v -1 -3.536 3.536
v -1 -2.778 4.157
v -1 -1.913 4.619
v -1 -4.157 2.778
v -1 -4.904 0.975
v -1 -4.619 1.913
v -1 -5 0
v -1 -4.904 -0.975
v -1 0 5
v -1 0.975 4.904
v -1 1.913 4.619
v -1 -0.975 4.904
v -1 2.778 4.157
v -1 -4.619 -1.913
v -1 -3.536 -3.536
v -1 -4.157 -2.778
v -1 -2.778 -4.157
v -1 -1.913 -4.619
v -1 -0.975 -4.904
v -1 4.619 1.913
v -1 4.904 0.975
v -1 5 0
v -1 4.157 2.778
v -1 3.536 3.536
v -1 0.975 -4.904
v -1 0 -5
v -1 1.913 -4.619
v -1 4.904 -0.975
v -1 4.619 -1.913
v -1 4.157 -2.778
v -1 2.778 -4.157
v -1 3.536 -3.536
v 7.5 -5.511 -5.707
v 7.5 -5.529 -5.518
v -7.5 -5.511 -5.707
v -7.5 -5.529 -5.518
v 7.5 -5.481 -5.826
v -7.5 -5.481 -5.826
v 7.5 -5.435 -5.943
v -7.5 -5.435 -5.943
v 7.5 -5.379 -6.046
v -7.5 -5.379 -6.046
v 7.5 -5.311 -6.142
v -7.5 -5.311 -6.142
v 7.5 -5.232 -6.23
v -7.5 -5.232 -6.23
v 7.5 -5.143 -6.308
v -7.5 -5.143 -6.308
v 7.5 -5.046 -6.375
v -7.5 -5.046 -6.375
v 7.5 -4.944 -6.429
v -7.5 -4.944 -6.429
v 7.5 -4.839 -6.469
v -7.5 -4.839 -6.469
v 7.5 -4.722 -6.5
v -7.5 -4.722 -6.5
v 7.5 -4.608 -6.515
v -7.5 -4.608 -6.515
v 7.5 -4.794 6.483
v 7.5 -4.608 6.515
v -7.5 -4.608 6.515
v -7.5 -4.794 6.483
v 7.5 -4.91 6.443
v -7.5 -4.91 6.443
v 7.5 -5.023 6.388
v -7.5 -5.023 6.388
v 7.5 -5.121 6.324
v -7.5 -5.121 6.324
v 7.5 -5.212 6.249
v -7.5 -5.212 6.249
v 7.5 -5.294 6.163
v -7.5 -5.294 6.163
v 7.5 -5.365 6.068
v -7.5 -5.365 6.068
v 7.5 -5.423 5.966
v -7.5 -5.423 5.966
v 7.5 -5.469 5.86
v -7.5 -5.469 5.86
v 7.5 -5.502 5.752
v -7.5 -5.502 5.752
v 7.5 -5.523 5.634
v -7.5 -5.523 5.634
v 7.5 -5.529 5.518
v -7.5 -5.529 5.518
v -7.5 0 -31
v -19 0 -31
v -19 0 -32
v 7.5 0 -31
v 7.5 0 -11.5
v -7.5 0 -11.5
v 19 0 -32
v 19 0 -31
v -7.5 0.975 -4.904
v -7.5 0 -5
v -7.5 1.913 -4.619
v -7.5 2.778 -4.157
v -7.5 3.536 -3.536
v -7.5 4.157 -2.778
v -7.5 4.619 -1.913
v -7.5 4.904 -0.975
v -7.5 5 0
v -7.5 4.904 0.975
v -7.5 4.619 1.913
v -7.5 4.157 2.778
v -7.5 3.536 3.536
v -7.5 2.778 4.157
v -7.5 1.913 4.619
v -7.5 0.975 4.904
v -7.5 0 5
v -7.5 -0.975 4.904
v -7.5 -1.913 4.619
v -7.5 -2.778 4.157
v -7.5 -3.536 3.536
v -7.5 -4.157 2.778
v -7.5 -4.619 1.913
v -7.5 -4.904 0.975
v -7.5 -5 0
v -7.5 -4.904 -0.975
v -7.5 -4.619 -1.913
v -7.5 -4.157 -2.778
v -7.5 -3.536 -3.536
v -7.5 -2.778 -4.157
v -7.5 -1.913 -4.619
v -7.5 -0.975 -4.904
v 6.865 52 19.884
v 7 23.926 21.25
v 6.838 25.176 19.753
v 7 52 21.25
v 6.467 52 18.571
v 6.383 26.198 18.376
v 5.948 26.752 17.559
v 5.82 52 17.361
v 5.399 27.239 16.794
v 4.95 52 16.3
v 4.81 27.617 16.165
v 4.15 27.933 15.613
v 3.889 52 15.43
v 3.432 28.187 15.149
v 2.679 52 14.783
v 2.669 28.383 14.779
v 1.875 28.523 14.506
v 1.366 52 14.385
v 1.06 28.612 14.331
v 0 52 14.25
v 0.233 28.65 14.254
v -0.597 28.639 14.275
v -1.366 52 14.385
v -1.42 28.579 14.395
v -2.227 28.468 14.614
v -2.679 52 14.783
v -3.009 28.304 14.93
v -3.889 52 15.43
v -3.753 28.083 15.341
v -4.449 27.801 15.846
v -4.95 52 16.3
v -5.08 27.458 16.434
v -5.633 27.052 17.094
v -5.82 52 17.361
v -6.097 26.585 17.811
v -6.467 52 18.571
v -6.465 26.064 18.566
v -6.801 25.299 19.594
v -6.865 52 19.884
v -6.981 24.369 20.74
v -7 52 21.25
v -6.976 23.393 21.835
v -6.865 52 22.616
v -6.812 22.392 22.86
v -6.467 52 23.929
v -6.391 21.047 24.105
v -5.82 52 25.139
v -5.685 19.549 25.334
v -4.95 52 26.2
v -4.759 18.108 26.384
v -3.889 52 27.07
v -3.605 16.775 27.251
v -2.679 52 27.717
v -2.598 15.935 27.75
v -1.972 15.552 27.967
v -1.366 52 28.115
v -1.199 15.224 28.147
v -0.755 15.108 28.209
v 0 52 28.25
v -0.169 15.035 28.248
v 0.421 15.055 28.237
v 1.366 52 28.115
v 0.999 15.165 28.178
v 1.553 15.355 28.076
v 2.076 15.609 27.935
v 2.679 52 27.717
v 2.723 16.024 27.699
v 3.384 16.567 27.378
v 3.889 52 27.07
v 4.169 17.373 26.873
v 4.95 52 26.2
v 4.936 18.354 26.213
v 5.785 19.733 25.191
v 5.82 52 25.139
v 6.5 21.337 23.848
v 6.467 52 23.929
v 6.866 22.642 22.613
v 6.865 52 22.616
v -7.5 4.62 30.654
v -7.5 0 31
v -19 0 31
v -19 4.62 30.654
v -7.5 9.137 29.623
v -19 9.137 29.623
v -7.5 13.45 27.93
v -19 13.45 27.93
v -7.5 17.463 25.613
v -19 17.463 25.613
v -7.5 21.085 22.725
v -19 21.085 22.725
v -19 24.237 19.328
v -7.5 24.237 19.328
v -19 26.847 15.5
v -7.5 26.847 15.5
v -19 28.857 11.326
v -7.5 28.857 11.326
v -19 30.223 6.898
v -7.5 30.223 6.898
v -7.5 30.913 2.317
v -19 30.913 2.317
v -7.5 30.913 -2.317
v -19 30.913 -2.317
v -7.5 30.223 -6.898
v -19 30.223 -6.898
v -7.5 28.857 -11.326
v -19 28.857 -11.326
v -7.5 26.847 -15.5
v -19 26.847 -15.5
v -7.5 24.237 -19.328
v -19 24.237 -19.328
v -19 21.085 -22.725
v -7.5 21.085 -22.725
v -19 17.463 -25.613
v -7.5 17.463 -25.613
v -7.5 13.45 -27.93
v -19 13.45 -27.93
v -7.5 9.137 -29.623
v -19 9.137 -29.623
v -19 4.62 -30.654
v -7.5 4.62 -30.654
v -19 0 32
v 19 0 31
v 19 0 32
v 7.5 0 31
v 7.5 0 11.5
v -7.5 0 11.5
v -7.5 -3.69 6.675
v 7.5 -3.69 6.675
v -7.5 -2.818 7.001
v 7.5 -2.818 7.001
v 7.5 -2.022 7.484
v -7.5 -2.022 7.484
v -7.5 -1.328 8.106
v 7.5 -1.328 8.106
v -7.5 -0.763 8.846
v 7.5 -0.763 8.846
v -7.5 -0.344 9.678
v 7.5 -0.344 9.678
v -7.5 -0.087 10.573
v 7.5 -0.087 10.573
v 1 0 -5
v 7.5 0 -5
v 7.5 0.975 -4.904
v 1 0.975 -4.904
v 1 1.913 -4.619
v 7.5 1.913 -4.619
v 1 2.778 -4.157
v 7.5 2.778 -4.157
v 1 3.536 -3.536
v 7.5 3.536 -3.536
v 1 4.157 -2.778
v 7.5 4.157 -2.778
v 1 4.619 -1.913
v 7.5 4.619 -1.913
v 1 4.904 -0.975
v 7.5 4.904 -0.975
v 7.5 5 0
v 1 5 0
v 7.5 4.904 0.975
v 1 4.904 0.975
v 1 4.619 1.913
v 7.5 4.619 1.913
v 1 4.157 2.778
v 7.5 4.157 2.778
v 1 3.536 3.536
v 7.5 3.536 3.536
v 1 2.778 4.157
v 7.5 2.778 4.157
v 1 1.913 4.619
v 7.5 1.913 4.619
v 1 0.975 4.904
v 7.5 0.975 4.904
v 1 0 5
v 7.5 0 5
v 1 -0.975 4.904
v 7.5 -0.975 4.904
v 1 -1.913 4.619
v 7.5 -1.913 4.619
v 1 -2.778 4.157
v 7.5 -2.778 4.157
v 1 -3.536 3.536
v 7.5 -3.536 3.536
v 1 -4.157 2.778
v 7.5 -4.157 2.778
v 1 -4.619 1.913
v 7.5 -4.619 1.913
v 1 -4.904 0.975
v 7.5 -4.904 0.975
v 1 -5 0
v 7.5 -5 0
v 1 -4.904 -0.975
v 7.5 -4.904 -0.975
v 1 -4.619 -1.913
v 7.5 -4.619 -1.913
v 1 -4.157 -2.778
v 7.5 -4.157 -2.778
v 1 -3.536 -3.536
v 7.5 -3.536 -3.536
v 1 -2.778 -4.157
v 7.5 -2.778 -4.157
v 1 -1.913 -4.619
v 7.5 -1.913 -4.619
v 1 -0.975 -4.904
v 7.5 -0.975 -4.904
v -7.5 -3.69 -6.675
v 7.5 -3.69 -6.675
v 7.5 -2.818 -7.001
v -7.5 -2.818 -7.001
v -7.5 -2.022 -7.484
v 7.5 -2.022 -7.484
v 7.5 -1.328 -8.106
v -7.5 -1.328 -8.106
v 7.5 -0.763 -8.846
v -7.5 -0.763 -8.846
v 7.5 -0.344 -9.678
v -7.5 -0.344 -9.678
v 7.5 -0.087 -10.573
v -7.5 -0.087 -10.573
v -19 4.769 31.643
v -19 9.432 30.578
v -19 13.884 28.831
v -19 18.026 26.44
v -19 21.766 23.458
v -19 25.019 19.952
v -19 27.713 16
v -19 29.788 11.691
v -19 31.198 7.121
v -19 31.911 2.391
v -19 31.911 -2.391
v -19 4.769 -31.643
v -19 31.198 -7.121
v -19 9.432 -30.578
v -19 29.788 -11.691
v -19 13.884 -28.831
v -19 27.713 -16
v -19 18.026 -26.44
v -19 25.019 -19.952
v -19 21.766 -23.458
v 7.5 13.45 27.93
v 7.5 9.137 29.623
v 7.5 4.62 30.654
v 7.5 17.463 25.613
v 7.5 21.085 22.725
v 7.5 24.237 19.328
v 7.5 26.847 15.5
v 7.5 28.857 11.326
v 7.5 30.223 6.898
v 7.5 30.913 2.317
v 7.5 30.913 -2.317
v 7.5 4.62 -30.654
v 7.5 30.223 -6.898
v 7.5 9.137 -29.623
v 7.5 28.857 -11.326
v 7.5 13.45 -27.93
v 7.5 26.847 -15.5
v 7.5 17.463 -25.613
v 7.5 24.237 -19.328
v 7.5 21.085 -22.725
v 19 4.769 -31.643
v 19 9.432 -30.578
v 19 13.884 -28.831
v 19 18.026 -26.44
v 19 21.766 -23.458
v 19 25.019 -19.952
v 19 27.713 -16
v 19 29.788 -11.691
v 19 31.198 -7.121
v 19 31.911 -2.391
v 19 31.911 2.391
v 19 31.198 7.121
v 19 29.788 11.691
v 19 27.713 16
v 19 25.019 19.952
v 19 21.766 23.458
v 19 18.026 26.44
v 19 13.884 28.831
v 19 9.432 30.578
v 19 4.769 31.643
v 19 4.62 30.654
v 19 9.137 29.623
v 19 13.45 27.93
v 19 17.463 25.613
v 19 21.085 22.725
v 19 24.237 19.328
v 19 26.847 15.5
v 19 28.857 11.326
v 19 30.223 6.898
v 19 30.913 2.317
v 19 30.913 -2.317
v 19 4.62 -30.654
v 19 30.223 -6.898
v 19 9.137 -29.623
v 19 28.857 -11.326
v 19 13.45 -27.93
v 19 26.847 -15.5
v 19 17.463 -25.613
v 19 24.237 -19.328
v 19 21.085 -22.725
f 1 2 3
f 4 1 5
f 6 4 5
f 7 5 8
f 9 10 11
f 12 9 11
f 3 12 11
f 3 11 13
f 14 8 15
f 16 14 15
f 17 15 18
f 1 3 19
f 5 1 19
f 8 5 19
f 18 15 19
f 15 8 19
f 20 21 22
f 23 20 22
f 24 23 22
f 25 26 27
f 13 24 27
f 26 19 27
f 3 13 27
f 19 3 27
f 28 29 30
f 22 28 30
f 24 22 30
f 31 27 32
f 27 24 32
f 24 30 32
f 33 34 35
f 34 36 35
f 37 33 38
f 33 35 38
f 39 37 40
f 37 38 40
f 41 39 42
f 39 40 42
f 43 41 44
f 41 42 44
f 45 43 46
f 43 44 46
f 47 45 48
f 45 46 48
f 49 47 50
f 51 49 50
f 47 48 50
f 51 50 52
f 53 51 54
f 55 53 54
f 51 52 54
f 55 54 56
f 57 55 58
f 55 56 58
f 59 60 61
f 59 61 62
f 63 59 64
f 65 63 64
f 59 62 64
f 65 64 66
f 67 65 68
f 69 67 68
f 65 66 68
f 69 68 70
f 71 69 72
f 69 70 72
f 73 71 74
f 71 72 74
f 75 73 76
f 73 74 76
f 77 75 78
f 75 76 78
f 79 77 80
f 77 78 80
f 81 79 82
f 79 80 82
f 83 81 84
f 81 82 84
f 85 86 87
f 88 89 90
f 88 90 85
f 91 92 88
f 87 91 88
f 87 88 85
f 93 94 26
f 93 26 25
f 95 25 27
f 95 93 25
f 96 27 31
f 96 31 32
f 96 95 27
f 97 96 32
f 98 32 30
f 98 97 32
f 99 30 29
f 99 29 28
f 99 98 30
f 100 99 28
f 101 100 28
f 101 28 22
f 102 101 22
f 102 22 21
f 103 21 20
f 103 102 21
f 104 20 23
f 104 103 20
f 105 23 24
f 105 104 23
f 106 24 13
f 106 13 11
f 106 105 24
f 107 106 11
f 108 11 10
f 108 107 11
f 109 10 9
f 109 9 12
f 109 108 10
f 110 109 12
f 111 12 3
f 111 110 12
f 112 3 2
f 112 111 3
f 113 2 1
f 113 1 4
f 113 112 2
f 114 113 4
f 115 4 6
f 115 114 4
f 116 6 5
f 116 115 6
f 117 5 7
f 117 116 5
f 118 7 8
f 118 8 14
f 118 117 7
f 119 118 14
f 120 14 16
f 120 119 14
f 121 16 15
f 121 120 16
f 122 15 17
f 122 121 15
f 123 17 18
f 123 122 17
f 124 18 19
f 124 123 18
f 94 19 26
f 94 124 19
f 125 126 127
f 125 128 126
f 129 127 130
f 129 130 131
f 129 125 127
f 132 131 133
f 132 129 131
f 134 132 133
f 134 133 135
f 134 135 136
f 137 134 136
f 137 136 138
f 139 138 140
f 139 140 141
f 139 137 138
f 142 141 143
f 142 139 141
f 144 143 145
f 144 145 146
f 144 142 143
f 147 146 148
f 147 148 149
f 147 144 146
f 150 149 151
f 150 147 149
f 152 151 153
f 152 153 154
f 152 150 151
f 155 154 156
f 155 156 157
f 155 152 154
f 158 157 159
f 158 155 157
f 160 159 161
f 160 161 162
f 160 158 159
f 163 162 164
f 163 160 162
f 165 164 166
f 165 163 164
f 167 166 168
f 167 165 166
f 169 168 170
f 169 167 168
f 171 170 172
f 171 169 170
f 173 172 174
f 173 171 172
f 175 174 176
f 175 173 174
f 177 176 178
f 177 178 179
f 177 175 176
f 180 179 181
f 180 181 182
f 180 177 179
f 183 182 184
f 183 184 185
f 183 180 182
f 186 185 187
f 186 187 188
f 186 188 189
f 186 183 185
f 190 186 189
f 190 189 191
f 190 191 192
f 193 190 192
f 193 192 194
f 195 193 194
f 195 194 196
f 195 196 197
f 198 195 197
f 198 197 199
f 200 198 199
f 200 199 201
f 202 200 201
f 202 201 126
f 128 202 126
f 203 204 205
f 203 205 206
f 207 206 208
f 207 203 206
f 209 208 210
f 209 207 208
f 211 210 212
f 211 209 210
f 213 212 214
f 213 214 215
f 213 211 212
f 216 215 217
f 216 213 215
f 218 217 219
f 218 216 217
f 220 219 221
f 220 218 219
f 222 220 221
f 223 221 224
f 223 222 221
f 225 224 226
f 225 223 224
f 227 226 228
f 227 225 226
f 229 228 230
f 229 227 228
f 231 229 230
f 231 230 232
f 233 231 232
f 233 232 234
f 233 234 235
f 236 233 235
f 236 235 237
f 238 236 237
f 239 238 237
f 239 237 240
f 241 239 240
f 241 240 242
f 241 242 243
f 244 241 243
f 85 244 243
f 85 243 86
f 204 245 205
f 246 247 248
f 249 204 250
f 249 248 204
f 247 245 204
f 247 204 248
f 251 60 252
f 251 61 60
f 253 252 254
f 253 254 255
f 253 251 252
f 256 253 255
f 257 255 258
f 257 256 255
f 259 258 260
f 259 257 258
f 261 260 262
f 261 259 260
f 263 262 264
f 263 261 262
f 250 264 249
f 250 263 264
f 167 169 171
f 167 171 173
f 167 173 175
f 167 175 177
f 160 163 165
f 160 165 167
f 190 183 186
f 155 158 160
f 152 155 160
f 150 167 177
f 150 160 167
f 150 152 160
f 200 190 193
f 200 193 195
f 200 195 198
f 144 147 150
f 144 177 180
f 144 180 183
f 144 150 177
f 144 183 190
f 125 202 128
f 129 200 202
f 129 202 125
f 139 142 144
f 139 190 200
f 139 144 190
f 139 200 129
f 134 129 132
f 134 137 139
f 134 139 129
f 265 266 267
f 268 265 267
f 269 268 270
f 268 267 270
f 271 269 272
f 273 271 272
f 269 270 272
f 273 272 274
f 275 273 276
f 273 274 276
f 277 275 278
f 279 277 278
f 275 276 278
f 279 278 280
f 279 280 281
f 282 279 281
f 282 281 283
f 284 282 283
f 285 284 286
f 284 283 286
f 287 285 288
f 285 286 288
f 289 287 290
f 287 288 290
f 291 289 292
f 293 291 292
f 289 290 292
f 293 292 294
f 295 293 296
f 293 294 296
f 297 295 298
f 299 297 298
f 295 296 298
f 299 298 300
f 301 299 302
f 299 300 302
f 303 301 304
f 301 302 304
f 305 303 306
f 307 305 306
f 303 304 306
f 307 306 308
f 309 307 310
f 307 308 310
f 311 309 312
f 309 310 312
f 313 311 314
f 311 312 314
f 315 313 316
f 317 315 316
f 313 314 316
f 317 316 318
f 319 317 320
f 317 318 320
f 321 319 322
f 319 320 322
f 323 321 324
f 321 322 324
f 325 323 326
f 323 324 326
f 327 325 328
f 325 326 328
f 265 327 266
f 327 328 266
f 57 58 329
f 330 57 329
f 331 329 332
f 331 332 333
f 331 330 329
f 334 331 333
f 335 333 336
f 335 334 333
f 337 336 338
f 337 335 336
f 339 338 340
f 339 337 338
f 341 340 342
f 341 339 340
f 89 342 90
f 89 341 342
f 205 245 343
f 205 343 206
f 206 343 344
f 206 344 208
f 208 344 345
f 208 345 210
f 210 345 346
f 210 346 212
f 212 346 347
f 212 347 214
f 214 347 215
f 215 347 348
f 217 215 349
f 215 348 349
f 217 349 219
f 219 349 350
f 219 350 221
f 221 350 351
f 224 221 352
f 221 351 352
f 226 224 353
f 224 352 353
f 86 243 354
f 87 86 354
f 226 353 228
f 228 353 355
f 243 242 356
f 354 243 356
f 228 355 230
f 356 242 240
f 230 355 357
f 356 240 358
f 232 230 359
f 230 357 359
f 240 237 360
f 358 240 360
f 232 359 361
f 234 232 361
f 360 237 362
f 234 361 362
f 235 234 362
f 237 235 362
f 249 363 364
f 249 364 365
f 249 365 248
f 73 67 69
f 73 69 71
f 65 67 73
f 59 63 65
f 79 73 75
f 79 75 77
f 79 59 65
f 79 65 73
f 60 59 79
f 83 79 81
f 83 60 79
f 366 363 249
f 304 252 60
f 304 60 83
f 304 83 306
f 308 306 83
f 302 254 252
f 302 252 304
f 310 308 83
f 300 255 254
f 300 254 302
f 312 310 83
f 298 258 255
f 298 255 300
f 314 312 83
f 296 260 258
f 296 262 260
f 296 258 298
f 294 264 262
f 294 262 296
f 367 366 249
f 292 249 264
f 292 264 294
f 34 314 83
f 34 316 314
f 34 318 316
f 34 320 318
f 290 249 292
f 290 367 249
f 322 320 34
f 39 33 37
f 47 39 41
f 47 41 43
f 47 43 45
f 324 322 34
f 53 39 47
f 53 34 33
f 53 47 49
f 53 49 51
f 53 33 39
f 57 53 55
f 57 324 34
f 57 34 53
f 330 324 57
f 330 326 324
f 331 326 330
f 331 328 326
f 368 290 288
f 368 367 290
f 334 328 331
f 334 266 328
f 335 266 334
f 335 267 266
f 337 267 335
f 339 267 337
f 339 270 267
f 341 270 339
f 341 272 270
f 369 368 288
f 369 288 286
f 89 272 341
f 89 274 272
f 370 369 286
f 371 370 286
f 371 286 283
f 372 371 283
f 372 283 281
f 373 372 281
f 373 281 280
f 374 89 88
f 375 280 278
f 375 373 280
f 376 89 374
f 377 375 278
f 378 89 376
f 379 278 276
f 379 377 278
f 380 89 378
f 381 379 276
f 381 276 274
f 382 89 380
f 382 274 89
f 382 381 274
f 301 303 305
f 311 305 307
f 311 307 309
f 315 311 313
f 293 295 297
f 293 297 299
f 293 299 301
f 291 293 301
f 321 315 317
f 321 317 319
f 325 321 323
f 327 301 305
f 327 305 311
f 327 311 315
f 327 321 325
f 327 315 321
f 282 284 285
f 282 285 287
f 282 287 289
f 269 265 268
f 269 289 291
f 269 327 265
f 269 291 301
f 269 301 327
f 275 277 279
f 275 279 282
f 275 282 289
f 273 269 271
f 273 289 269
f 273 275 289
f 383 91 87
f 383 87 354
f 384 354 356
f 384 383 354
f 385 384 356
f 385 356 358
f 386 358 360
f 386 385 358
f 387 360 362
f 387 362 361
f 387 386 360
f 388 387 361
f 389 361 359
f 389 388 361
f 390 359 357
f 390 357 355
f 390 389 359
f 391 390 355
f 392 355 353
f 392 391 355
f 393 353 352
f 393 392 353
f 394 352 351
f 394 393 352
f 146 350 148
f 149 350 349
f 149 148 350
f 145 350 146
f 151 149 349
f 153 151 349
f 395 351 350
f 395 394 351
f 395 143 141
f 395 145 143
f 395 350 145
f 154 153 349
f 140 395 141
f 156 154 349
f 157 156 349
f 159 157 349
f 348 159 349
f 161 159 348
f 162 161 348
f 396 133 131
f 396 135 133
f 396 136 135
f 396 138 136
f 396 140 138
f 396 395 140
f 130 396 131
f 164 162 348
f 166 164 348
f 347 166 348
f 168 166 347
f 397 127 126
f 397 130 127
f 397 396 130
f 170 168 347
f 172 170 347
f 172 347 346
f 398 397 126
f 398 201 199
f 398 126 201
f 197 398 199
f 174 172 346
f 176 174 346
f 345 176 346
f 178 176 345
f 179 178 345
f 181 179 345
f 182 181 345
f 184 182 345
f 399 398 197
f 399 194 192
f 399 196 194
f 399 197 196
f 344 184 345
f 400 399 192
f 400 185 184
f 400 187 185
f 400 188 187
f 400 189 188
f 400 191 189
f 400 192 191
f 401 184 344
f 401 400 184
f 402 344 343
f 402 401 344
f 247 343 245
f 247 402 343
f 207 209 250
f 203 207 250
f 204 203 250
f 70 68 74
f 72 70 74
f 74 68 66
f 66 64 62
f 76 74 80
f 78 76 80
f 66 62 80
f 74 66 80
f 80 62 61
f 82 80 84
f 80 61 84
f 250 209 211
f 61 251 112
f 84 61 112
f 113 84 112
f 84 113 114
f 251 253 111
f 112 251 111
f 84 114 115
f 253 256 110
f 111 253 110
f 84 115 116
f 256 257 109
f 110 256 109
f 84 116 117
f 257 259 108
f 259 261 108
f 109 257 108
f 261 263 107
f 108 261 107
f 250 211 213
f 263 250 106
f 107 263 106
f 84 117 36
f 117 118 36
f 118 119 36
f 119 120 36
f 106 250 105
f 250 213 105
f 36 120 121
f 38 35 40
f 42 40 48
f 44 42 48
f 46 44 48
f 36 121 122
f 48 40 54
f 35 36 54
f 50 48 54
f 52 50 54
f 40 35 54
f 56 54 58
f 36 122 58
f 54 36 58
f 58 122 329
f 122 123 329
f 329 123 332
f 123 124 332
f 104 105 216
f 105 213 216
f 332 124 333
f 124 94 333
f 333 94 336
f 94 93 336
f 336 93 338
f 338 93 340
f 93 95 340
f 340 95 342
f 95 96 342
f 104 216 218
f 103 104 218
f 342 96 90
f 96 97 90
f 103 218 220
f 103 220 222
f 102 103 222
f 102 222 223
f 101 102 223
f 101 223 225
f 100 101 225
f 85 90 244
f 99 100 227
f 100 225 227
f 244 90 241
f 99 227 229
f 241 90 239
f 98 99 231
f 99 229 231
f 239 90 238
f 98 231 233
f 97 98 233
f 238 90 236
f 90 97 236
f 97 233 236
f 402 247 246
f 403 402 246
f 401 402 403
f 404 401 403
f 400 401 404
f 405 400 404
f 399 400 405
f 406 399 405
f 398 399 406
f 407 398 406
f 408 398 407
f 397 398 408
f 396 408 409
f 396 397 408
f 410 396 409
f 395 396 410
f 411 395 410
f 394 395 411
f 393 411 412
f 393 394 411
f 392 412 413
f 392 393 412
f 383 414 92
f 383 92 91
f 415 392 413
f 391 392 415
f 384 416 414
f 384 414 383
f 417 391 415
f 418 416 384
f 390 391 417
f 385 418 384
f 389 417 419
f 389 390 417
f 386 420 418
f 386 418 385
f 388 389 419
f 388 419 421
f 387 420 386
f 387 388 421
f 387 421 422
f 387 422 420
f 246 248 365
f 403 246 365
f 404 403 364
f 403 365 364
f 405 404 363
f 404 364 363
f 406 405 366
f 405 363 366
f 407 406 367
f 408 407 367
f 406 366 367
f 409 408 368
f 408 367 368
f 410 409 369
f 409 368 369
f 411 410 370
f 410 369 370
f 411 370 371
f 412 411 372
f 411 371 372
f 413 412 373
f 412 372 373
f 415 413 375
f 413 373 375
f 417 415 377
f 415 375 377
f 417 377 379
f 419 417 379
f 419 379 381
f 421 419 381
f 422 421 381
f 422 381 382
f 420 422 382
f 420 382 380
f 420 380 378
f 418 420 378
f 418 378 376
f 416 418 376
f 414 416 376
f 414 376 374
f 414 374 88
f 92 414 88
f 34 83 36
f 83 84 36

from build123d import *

# Parameters (mm, degrees)
BOSS_EXTRUDE1_DEPTH      = 19
BOSS_EXTRUDE2_DEPTH      = 7.5
SKETCH2_W                = 13
SKETCH2_H                = 5.529275222
BOSS_EXTRUDE3_DEPTH      = 7.5
SKETCH2_3_R              = 5
CUT_EXTRUDE1_DEPTH       = 6.5
FILLET2_R                = 5
FILLET3_R                = 5
FILLET4_R                = 1
BOSS_EXTRUDE4_DEPTH      = 20
BOSS_EXTRUDE4_DEPTH_BACK = 18
SKETCH3_R                = 7


with BuildPart() as part:
    # Sketch1 → Boss-Extrude1 (new body)
    with BuildSketch(Plane(origin=(0, 0, 0), x_dir=(0, 0, -1), z_dir=(1, 0, 0))):
        with BuildLine():
            ThreePointArc((32, 0), (0, 32), (-32, 0))
            Line((-32, 0), (-31, 0))
            ThreePointArc((-31, 0), (0, 31), (31, 0))
            Line((31, 0), (32, 0))
        make_face()
    extrude(amount=BOSS_EXTRUDE1_DEPTH)

    # Sketch1<3> → Boss-Extrude2 (add)
    with BuildSketch(Plane(origin=(0, 0, 0), x_dir=(0, 0, -1), z_dir=(1, 0, 0))):
        with BuildLine():
            ThreePointArc((31, 0), (0, 31), (-31, 0))
            Line((-31, 0), (31, 0))
        make_face()
    extrude(amount=BOSS_EXTRUDE2_DEPTH)

    # Sketch2 → Boss-Extrude3 (add)
    with BuildSketch(Plane(origin=(7.5, 0, 0), x_dir=(0, 0, -1), z_dir=(1, 0, 0))):
        with Locations((0, -2.764637611)):
            Rectangle(SKETCH2_W, SKETCH2_H)
    extrude(amount=-BOSS_EXTRUDE3_DEPTH)

    # Sketch2<3> → Cut-Extrude1 (cut)
    with BuildSketch(Plane(origin=(7.5, 0, 0), x_dir=(0, 0, -1), z_dir=(1, 0, 0))):
        Circle(SKETCH2_3_R)
    extrude(amount=-CUT_EXTRUDE1_DEPTH, mode=Mode.SUBTRACT)

    # Mirror2: part across plane


with BuildPart() as part_1:
    add(part.part)
    add(part.part.mirror(Plane(origin=(0, 0, 0), x_dir=(0, 0, 1), z_dir=(1, 0, 0))))

    # Fillet2
    fillet2_edges = [part_1.edges().sort_by_distance(p)[0] for p in [
        (0, 0, -6.5),
    ]]
    fillet(fillet2_edges, radius=FILLET2_R)

    # Fillet3
    fillet3_edges = [part_1.edges().sort_by_distance(p)[0] for p in [
        (0, 0, 6.5),
    ]]
    fillet(fillet3_edges, radius=FILLET3_R)

    # Fillet4
    fillet4_edges = [part_1.edges().sort_by_distance(p)[0] for p in [
        (0, -5.529275222, 6.5),
        (0, -5.529275222, -6.5),
    ]]
    fillet(fillet4_edges, radius=FILLET4_R)

    # Sketch3 → Boss-Extrude4 (add, two sides: drawn at the far end of the back side and taken through both)
    with BuildSketch(Plane(origin=(0, 32, 0), x_dir=(1, 0, 0), z_dir=(0, 1, 0)).offset(-BOSS_EXTRUDE4_DEPTH_BACK)):
        with Locations((0, -21.25)):
            Circle(SKETCH3_R)
    extrude(amount=BOSS_EXTRUDE4_DEPTH + BOSS_EXTRUDE4_DEPTH_BACK)


solid = part_1.part
